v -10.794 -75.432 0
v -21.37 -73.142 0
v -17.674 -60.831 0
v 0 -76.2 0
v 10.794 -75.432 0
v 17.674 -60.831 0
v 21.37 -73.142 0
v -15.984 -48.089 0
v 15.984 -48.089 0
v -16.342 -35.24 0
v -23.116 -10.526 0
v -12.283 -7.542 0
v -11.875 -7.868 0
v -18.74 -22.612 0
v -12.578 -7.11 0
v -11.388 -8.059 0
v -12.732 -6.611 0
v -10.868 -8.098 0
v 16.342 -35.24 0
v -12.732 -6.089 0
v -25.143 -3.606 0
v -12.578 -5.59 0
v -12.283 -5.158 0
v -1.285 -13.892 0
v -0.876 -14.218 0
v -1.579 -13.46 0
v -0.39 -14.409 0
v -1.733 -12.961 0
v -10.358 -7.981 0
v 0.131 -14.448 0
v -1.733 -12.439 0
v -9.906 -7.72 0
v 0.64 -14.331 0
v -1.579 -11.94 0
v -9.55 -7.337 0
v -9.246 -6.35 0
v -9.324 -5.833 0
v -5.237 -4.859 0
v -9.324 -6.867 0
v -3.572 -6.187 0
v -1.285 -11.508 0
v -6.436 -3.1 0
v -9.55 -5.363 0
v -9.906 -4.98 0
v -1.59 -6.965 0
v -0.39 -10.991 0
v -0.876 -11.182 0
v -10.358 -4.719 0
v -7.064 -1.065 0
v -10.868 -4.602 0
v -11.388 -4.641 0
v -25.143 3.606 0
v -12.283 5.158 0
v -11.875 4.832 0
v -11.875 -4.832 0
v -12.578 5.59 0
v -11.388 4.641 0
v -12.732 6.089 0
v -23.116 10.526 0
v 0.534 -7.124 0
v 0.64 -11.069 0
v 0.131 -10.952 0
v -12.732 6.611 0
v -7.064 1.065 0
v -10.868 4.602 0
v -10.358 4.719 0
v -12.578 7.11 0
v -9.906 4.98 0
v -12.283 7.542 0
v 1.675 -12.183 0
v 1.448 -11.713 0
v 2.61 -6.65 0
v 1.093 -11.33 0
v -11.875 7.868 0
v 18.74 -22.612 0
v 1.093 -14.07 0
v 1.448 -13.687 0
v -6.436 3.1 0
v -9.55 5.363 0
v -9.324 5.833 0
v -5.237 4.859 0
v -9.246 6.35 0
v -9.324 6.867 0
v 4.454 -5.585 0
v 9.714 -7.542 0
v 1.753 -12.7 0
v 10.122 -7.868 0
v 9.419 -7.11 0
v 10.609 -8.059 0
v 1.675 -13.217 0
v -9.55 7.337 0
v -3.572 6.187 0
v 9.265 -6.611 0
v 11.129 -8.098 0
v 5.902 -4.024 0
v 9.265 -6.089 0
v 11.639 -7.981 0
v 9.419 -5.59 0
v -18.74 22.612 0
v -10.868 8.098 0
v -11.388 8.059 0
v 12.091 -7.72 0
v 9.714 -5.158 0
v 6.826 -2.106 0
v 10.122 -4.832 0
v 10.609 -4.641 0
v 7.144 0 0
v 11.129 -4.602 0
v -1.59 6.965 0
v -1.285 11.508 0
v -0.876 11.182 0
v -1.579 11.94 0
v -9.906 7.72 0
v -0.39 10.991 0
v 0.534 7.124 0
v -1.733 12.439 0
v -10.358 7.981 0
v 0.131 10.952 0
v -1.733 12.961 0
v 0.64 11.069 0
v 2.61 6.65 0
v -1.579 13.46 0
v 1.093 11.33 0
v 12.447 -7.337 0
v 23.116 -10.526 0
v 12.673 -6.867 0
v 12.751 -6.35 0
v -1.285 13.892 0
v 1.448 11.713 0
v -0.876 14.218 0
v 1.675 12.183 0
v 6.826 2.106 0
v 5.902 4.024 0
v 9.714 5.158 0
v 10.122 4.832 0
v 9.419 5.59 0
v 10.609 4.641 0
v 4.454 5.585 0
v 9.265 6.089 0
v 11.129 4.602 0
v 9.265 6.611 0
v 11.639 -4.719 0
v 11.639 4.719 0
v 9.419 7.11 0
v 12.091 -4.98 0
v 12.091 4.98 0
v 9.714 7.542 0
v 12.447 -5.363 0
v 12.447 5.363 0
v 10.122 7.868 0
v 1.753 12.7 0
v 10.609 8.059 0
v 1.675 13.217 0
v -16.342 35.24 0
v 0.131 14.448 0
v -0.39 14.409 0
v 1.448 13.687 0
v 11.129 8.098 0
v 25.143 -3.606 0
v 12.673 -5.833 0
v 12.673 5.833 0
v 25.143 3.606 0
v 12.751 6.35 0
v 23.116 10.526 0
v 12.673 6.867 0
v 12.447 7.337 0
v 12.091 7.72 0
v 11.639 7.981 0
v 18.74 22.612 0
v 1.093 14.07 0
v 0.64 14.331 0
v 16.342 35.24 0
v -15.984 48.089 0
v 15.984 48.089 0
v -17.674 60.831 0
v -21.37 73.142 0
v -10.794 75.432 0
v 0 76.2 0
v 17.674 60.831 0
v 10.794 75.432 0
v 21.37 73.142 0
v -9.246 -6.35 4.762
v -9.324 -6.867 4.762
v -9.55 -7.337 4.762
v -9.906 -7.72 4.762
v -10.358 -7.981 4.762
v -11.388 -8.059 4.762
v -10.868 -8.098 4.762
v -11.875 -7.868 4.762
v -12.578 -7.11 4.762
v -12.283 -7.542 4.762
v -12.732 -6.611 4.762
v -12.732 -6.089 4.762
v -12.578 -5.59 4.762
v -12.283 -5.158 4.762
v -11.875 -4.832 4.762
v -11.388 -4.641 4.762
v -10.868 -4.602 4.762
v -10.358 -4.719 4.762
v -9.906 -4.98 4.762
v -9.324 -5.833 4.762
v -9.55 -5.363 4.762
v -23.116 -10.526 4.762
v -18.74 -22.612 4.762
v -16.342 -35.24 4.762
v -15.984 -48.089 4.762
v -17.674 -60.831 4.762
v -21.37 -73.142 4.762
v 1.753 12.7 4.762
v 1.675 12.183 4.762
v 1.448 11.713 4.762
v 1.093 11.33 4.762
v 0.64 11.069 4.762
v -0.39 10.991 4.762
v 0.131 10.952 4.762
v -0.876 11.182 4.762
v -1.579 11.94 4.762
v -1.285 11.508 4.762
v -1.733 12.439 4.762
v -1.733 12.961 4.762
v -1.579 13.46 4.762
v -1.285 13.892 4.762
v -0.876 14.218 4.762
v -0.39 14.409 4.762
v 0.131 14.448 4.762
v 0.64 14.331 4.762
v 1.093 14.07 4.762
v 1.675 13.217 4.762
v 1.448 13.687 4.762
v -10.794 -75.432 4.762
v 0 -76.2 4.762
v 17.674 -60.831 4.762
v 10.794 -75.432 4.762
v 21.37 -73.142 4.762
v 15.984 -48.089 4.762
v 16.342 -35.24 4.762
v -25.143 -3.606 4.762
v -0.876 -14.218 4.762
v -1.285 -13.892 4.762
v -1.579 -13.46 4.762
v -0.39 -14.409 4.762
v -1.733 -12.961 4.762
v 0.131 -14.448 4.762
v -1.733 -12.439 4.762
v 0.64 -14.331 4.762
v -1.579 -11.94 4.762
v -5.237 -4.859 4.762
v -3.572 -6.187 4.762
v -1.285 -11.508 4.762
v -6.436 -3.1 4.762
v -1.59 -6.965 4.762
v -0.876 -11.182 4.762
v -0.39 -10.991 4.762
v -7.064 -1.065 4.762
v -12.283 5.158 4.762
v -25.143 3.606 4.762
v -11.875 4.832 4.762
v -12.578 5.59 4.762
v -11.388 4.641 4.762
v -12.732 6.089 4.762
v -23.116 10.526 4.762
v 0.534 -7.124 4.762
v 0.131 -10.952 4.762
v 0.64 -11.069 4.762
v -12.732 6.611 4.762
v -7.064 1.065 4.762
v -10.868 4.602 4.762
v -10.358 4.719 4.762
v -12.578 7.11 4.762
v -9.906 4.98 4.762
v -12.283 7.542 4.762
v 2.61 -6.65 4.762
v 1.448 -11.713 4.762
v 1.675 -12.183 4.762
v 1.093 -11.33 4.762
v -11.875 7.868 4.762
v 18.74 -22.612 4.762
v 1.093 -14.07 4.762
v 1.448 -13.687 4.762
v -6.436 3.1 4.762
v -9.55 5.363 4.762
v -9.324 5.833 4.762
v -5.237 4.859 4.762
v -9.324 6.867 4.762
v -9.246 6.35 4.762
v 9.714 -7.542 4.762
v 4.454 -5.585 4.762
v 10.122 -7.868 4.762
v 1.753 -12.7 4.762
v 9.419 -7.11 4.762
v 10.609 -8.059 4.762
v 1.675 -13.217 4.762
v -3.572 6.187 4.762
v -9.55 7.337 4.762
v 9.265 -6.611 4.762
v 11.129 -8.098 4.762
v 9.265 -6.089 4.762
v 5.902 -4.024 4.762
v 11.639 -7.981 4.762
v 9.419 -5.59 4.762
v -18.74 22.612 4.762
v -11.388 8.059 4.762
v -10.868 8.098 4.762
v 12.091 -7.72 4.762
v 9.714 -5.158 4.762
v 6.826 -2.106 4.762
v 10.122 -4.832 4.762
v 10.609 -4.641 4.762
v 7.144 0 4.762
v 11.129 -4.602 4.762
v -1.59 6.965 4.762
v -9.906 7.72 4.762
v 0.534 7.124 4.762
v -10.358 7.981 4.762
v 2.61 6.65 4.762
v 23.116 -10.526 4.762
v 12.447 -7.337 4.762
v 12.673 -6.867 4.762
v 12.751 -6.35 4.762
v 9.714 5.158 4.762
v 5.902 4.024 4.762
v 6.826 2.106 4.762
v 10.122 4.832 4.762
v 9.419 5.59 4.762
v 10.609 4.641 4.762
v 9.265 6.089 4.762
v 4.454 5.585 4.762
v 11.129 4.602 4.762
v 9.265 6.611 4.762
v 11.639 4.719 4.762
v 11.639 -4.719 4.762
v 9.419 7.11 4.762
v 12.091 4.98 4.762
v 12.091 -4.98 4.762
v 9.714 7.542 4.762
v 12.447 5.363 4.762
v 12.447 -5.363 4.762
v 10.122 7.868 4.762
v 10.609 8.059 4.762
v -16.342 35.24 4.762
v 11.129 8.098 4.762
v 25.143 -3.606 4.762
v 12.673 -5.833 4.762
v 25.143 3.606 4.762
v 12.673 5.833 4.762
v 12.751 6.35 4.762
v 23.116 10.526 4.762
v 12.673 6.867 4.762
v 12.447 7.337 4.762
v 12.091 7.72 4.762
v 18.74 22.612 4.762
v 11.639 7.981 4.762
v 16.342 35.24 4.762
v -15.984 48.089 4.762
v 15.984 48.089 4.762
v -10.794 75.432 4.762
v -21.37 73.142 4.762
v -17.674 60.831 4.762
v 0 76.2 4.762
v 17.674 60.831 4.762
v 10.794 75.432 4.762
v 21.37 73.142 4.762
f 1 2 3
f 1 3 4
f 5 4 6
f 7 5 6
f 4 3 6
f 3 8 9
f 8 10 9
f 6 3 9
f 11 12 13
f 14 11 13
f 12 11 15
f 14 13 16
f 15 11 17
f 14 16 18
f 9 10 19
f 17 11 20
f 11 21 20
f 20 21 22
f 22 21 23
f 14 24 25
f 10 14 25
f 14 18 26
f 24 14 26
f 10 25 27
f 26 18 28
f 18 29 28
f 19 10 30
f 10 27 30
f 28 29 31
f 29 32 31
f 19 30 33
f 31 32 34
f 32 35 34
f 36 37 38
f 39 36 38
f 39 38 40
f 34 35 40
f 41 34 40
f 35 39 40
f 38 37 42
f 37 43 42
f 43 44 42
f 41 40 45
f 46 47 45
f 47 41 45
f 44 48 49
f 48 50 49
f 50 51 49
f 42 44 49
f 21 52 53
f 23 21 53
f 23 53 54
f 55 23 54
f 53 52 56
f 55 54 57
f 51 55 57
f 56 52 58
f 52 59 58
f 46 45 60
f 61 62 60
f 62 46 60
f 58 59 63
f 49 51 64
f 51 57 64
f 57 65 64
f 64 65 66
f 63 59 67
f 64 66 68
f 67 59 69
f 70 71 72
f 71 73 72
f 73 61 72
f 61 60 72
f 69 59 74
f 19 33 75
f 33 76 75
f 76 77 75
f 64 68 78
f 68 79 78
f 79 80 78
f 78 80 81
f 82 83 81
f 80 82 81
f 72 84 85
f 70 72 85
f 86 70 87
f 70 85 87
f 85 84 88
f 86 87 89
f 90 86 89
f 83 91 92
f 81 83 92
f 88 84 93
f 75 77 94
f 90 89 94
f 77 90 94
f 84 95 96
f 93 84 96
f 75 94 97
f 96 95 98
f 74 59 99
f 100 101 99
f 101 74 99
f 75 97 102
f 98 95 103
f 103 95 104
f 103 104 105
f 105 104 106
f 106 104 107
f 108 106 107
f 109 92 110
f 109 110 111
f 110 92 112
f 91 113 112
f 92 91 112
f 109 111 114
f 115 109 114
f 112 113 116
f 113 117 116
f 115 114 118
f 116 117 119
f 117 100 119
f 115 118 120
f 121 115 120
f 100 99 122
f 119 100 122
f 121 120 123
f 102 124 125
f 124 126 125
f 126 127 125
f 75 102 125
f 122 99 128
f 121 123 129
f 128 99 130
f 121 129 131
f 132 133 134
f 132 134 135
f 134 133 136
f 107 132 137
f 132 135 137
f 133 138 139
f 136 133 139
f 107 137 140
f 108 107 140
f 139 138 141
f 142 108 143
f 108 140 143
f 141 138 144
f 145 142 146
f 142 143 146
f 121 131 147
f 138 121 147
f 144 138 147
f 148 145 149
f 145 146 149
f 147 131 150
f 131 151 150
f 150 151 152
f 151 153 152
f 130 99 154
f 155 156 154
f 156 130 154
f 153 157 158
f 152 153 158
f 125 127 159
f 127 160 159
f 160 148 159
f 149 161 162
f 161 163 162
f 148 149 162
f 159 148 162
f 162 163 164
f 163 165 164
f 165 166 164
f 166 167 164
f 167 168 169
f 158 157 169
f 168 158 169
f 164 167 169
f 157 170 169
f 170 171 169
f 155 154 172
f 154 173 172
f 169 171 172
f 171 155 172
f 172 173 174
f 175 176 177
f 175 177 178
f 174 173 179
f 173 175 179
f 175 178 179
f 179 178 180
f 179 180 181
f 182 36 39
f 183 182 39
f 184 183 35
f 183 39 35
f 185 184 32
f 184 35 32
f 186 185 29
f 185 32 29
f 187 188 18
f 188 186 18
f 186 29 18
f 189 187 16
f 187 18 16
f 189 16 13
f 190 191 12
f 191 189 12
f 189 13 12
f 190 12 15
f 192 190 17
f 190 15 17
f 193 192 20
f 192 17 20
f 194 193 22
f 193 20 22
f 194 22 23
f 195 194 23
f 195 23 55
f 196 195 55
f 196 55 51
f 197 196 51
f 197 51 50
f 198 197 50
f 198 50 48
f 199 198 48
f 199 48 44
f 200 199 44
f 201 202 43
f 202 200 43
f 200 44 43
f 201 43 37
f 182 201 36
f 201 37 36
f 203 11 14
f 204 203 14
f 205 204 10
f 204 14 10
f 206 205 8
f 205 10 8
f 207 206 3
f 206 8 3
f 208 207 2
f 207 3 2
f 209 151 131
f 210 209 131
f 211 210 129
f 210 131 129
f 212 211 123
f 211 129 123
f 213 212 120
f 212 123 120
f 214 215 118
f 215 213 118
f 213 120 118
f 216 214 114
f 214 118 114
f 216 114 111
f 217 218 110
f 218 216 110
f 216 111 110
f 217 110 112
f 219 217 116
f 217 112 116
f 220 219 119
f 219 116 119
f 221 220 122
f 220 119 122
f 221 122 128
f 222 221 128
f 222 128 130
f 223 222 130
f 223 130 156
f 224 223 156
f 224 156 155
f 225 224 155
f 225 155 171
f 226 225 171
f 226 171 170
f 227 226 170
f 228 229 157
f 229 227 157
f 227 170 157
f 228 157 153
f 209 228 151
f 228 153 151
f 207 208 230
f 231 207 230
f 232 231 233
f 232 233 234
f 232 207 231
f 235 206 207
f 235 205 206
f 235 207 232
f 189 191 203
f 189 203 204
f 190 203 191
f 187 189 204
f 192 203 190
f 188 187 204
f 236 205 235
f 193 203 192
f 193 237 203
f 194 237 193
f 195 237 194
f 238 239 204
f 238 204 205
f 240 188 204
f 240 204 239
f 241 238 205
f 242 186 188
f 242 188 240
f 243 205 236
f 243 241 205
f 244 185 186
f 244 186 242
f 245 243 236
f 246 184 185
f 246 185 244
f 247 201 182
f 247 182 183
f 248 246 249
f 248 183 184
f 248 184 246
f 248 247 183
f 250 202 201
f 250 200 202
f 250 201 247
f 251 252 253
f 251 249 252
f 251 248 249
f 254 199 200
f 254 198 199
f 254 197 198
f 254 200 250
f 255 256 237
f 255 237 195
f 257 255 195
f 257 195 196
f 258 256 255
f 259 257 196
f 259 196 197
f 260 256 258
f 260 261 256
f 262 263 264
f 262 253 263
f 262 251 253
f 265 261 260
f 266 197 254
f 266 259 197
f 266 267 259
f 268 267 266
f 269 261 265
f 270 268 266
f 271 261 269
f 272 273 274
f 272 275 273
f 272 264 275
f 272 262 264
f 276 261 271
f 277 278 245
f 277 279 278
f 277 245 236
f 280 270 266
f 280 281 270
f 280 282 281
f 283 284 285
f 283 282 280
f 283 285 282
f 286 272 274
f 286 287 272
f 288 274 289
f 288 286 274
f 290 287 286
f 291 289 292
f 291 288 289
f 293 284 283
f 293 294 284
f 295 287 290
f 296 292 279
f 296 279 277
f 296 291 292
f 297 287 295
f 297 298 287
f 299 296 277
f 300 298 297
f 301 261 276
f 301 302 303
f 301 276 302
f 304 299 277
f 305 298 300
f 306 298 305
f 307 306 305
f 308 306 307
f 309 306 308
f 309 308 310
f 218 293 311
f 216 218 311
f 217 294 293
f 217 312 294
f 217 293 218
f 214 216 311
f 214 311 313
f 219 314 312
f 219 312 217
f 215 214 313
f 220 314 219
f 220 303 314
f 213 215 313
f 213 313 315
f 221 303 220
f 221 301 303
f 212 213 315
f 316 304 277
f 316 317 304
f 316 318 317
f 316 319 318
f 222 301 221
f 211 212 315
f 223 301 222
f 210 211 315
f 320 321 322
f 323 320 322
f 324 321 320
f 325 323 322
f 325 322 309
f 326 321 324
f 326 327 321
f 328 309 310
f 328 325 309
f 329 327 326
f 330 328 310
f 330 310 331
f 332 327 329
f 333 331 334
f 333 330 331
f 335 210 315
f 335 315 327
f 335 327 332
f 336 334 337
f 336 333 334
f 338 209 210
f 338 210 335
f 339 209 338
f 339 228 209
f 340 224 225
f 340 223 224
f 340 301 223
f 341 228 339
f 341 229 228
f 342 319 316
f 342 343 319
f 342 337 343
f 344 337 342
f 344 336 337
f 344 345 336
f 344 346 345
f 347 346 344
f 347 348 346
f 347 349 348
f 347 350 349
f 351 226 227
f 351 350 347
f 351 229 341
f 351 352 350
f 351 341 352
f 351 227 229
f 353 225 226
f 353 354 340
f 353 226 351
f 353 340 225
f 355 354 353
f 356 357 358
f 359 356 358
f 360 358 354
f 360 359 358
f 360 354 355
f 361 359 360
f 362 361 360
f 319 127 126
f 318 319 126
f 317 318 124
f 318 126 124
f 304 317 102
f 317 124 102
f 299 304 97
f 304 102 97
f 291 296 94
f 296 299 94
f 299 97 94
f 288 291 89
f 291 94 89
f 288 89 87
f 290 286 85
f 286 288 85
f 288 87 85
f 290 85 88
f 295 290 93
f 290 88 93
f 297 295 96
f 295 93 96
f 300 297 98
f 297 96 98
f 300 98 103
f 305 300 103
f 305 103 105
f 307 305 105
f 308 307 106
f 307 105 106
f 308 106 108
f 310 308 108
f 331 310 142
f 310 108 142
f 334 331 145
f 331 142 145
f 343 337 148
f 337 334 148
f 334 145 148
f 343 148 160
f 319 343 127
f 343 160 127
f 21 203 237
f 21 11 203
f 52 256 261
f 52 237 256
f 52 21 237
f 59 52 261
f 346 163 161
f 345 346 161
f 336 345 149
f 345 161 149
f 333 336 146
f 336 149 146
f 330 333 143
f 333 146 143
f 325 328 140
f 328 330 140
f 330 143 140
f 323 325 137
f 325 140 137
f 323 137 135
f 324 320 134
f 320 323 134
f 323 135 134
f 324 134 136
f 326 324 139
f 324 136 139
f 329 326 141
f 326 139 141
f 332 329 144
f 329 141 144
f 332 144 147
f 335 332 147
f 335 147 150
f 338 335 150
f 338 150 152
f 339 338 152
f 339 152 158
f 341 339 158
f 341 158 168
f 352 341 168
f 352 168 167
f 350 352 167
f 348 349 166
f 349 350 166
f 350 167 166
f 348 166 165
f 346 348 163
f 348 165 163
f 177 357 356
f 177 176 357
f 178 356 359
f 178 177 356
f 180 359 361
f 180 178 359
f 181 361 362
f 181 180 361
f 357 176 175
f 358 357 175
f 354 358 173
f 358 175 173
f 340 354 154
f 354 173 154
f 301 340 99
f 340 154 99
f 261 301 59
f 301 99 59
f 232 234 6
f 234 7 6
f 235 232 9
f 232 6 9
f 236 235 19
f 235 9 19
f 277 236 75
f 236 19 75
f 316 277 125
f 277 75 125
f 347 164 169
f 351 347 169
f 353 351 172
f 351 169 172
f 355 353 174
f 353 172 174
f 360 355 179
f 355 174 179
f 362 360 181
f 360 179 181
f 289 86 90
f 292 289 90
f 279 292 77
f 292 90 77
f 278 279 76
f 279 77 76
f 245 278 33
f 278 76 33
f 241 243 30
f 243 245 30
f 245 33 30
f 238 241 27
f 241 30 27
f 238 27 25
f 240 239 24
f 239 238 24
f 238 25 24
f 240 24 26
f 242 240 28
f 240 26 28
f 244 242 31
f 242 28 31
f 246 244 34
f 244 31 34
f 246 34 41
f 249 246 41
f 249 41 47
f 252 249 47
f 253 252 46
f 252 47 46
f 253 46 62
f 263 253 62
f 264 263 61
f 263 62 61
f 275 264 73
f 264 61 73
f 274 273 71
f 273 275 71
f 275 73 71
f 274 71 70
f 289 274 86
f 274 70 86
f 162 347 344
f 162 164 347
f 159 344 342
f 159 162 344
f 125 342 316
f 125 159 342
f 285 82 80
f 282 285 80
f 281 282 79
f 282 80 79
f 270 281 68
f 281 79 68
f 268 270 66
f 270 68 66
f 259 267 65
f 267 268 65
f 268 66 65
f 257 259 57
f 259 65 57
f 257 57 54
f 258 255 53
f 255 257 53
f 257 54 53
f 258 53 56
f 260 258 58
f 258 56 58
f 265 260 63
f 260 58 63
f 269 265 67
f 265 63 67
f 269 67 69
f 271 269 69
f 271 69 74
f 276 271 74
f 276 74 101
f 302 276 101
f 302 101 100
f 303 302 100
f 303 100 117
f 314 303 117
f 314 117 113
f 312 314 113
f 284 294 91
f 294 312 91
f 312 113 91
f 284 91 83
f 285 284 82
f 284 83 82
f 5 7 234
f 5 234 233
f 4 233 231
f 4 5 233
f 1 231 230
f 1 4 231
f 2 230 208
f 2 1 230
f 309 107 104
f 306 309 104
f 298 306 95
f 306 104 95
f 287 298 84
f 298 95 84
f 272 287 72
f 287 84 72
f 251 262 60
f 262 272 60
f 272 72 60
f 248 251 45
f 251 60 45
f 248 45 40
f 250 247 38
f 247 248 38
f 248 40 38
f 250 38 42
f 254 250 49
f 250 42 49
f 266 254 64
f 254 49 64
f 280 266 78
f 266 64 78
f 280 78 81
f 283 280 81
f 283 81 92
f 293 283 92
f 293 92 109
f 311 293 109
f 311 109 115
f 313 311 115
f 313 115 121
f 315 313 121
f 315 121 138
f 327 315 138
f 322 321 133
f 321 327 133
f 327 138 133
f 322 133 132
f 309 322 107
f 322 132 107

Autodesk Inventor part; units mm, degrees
ref_plane "YZ Plane" through (0, 0, 0) normal (1, 0, 0) x (0, 1, 0)
ref_plane "XZ Plane" through (0, 0, 0) normal (0, 1, 0) x (-1, 0, 0)
ref_plane "XY Plane" through (0, 0, 0) normal (0, 0, 1) x (1, 0, 0)
sketch "Sketch1" plane through (0, 0, 0) normal (0, 0, 1) x (1, 0, 0)
  circle A0 centre (0, 0) radius 7.1437
  line L0 (0, 0) -> (0, 12.7) construction
  circle A1 centre (0, 12.7) radius 1.7526
  circle A2 centre (-10.9985, 6.35) radius 1.7526
  circle A3 centre (-10.9985, -6.35) radius 1.7526
  circle A4 centre (0, -12.7) radius 1.7526
  circle A5 centre (10.9985, -6.35) radius 1.7526
  circle A6 centre (10.9985, 6.35) radius 1.7526
  circle A7 centre (0, 0) radius 76.2 construction
  line L1 (-15.875, -74.528) -> (15.875, -74.528) construction
  line L2 (15.875, -74.528) -> (15.875, 74.528) construction
  line L3 (15.875, 74.528) -> (-15.875, 74.528) construction
  line L4 (-15.875, 74.528) -> (-15.875, -74.528) construction
  line L5 (-15.875, -74.528) -> (15.875, 74.528) construction
  line L6 (15.875, -74.528) -> (-15.875, 74.528) construction
  line L7 (0, 76.2) -> (0, -76.2) construction
  line L8 (0, 0) -> (21.3699, 73.1421) construction
  circle A8 centre (0, 0) radius 66.675 construction
  circle A9 centre (0, 0) radius 25.4
  line L9 (21.3699, 73.1421) -> (17.8969, 64.2282) construction
  arc A10 (21.3699, 73.1421) -> (-21.3699, 73.1421) centre (0, 0) ccw
  line L10 (-15.875, 0) -> (15.875, 0) construction
  arc A11 (-21.3699, -73.1421) -> (21.3699, -73.1421) centre (0, 0) ccw
  arc A12 (21.3699, 73.1421) -> (23.1163, 10.5259) centre (96.4161, 43.9028) ccw
  arc A13 (-23.1163, 10.5259) -> (-21.3699, 73.1421) centre (-96.4161, 43.9028) ccw
  arc A14 (23.1163, -10.5259) -> (21.3699, -73.1421) centre (96.4161, -43.9028) ccw
  arc A15 (-21.3699, -73.1421) -> (-23.1163, -10.5259) centre (-96.4161, -43.9028) ccw
  point P0 (0, 74.528)
  point P1 (0, -66.675)
  point P2 (23.1163, -10.5259)
  point P3 (-23.1163, -10.5259)
  point P4 (-23.1163, 10.5259)
  dimension "d10" = 50.8
  dimension "d0" = 14.2875
  dimension "d1" = 12.7
  dimension "d2" = 3.5052
  dimension "d5" = 360
  dimension "d7" = 152.4
  dimension "d8" = 31.75
  dimension "d9" = 9.525
  dimension "d11" = 5
extrude "Extrusion1" add sketch "Sketch1" along normal blind 4.7625
sketch "Sketch3" plane through (0, 0, 0) normal (0, 0, -1) x (-1, 0, 0)
  circle A0 centre (0, 0) radius 76.2 construction
  point P0 (21.3699, 73.1421)
  dimension "d25" = 152.4
properties part number "Blade (Bar)" material "Stainless Steel"
